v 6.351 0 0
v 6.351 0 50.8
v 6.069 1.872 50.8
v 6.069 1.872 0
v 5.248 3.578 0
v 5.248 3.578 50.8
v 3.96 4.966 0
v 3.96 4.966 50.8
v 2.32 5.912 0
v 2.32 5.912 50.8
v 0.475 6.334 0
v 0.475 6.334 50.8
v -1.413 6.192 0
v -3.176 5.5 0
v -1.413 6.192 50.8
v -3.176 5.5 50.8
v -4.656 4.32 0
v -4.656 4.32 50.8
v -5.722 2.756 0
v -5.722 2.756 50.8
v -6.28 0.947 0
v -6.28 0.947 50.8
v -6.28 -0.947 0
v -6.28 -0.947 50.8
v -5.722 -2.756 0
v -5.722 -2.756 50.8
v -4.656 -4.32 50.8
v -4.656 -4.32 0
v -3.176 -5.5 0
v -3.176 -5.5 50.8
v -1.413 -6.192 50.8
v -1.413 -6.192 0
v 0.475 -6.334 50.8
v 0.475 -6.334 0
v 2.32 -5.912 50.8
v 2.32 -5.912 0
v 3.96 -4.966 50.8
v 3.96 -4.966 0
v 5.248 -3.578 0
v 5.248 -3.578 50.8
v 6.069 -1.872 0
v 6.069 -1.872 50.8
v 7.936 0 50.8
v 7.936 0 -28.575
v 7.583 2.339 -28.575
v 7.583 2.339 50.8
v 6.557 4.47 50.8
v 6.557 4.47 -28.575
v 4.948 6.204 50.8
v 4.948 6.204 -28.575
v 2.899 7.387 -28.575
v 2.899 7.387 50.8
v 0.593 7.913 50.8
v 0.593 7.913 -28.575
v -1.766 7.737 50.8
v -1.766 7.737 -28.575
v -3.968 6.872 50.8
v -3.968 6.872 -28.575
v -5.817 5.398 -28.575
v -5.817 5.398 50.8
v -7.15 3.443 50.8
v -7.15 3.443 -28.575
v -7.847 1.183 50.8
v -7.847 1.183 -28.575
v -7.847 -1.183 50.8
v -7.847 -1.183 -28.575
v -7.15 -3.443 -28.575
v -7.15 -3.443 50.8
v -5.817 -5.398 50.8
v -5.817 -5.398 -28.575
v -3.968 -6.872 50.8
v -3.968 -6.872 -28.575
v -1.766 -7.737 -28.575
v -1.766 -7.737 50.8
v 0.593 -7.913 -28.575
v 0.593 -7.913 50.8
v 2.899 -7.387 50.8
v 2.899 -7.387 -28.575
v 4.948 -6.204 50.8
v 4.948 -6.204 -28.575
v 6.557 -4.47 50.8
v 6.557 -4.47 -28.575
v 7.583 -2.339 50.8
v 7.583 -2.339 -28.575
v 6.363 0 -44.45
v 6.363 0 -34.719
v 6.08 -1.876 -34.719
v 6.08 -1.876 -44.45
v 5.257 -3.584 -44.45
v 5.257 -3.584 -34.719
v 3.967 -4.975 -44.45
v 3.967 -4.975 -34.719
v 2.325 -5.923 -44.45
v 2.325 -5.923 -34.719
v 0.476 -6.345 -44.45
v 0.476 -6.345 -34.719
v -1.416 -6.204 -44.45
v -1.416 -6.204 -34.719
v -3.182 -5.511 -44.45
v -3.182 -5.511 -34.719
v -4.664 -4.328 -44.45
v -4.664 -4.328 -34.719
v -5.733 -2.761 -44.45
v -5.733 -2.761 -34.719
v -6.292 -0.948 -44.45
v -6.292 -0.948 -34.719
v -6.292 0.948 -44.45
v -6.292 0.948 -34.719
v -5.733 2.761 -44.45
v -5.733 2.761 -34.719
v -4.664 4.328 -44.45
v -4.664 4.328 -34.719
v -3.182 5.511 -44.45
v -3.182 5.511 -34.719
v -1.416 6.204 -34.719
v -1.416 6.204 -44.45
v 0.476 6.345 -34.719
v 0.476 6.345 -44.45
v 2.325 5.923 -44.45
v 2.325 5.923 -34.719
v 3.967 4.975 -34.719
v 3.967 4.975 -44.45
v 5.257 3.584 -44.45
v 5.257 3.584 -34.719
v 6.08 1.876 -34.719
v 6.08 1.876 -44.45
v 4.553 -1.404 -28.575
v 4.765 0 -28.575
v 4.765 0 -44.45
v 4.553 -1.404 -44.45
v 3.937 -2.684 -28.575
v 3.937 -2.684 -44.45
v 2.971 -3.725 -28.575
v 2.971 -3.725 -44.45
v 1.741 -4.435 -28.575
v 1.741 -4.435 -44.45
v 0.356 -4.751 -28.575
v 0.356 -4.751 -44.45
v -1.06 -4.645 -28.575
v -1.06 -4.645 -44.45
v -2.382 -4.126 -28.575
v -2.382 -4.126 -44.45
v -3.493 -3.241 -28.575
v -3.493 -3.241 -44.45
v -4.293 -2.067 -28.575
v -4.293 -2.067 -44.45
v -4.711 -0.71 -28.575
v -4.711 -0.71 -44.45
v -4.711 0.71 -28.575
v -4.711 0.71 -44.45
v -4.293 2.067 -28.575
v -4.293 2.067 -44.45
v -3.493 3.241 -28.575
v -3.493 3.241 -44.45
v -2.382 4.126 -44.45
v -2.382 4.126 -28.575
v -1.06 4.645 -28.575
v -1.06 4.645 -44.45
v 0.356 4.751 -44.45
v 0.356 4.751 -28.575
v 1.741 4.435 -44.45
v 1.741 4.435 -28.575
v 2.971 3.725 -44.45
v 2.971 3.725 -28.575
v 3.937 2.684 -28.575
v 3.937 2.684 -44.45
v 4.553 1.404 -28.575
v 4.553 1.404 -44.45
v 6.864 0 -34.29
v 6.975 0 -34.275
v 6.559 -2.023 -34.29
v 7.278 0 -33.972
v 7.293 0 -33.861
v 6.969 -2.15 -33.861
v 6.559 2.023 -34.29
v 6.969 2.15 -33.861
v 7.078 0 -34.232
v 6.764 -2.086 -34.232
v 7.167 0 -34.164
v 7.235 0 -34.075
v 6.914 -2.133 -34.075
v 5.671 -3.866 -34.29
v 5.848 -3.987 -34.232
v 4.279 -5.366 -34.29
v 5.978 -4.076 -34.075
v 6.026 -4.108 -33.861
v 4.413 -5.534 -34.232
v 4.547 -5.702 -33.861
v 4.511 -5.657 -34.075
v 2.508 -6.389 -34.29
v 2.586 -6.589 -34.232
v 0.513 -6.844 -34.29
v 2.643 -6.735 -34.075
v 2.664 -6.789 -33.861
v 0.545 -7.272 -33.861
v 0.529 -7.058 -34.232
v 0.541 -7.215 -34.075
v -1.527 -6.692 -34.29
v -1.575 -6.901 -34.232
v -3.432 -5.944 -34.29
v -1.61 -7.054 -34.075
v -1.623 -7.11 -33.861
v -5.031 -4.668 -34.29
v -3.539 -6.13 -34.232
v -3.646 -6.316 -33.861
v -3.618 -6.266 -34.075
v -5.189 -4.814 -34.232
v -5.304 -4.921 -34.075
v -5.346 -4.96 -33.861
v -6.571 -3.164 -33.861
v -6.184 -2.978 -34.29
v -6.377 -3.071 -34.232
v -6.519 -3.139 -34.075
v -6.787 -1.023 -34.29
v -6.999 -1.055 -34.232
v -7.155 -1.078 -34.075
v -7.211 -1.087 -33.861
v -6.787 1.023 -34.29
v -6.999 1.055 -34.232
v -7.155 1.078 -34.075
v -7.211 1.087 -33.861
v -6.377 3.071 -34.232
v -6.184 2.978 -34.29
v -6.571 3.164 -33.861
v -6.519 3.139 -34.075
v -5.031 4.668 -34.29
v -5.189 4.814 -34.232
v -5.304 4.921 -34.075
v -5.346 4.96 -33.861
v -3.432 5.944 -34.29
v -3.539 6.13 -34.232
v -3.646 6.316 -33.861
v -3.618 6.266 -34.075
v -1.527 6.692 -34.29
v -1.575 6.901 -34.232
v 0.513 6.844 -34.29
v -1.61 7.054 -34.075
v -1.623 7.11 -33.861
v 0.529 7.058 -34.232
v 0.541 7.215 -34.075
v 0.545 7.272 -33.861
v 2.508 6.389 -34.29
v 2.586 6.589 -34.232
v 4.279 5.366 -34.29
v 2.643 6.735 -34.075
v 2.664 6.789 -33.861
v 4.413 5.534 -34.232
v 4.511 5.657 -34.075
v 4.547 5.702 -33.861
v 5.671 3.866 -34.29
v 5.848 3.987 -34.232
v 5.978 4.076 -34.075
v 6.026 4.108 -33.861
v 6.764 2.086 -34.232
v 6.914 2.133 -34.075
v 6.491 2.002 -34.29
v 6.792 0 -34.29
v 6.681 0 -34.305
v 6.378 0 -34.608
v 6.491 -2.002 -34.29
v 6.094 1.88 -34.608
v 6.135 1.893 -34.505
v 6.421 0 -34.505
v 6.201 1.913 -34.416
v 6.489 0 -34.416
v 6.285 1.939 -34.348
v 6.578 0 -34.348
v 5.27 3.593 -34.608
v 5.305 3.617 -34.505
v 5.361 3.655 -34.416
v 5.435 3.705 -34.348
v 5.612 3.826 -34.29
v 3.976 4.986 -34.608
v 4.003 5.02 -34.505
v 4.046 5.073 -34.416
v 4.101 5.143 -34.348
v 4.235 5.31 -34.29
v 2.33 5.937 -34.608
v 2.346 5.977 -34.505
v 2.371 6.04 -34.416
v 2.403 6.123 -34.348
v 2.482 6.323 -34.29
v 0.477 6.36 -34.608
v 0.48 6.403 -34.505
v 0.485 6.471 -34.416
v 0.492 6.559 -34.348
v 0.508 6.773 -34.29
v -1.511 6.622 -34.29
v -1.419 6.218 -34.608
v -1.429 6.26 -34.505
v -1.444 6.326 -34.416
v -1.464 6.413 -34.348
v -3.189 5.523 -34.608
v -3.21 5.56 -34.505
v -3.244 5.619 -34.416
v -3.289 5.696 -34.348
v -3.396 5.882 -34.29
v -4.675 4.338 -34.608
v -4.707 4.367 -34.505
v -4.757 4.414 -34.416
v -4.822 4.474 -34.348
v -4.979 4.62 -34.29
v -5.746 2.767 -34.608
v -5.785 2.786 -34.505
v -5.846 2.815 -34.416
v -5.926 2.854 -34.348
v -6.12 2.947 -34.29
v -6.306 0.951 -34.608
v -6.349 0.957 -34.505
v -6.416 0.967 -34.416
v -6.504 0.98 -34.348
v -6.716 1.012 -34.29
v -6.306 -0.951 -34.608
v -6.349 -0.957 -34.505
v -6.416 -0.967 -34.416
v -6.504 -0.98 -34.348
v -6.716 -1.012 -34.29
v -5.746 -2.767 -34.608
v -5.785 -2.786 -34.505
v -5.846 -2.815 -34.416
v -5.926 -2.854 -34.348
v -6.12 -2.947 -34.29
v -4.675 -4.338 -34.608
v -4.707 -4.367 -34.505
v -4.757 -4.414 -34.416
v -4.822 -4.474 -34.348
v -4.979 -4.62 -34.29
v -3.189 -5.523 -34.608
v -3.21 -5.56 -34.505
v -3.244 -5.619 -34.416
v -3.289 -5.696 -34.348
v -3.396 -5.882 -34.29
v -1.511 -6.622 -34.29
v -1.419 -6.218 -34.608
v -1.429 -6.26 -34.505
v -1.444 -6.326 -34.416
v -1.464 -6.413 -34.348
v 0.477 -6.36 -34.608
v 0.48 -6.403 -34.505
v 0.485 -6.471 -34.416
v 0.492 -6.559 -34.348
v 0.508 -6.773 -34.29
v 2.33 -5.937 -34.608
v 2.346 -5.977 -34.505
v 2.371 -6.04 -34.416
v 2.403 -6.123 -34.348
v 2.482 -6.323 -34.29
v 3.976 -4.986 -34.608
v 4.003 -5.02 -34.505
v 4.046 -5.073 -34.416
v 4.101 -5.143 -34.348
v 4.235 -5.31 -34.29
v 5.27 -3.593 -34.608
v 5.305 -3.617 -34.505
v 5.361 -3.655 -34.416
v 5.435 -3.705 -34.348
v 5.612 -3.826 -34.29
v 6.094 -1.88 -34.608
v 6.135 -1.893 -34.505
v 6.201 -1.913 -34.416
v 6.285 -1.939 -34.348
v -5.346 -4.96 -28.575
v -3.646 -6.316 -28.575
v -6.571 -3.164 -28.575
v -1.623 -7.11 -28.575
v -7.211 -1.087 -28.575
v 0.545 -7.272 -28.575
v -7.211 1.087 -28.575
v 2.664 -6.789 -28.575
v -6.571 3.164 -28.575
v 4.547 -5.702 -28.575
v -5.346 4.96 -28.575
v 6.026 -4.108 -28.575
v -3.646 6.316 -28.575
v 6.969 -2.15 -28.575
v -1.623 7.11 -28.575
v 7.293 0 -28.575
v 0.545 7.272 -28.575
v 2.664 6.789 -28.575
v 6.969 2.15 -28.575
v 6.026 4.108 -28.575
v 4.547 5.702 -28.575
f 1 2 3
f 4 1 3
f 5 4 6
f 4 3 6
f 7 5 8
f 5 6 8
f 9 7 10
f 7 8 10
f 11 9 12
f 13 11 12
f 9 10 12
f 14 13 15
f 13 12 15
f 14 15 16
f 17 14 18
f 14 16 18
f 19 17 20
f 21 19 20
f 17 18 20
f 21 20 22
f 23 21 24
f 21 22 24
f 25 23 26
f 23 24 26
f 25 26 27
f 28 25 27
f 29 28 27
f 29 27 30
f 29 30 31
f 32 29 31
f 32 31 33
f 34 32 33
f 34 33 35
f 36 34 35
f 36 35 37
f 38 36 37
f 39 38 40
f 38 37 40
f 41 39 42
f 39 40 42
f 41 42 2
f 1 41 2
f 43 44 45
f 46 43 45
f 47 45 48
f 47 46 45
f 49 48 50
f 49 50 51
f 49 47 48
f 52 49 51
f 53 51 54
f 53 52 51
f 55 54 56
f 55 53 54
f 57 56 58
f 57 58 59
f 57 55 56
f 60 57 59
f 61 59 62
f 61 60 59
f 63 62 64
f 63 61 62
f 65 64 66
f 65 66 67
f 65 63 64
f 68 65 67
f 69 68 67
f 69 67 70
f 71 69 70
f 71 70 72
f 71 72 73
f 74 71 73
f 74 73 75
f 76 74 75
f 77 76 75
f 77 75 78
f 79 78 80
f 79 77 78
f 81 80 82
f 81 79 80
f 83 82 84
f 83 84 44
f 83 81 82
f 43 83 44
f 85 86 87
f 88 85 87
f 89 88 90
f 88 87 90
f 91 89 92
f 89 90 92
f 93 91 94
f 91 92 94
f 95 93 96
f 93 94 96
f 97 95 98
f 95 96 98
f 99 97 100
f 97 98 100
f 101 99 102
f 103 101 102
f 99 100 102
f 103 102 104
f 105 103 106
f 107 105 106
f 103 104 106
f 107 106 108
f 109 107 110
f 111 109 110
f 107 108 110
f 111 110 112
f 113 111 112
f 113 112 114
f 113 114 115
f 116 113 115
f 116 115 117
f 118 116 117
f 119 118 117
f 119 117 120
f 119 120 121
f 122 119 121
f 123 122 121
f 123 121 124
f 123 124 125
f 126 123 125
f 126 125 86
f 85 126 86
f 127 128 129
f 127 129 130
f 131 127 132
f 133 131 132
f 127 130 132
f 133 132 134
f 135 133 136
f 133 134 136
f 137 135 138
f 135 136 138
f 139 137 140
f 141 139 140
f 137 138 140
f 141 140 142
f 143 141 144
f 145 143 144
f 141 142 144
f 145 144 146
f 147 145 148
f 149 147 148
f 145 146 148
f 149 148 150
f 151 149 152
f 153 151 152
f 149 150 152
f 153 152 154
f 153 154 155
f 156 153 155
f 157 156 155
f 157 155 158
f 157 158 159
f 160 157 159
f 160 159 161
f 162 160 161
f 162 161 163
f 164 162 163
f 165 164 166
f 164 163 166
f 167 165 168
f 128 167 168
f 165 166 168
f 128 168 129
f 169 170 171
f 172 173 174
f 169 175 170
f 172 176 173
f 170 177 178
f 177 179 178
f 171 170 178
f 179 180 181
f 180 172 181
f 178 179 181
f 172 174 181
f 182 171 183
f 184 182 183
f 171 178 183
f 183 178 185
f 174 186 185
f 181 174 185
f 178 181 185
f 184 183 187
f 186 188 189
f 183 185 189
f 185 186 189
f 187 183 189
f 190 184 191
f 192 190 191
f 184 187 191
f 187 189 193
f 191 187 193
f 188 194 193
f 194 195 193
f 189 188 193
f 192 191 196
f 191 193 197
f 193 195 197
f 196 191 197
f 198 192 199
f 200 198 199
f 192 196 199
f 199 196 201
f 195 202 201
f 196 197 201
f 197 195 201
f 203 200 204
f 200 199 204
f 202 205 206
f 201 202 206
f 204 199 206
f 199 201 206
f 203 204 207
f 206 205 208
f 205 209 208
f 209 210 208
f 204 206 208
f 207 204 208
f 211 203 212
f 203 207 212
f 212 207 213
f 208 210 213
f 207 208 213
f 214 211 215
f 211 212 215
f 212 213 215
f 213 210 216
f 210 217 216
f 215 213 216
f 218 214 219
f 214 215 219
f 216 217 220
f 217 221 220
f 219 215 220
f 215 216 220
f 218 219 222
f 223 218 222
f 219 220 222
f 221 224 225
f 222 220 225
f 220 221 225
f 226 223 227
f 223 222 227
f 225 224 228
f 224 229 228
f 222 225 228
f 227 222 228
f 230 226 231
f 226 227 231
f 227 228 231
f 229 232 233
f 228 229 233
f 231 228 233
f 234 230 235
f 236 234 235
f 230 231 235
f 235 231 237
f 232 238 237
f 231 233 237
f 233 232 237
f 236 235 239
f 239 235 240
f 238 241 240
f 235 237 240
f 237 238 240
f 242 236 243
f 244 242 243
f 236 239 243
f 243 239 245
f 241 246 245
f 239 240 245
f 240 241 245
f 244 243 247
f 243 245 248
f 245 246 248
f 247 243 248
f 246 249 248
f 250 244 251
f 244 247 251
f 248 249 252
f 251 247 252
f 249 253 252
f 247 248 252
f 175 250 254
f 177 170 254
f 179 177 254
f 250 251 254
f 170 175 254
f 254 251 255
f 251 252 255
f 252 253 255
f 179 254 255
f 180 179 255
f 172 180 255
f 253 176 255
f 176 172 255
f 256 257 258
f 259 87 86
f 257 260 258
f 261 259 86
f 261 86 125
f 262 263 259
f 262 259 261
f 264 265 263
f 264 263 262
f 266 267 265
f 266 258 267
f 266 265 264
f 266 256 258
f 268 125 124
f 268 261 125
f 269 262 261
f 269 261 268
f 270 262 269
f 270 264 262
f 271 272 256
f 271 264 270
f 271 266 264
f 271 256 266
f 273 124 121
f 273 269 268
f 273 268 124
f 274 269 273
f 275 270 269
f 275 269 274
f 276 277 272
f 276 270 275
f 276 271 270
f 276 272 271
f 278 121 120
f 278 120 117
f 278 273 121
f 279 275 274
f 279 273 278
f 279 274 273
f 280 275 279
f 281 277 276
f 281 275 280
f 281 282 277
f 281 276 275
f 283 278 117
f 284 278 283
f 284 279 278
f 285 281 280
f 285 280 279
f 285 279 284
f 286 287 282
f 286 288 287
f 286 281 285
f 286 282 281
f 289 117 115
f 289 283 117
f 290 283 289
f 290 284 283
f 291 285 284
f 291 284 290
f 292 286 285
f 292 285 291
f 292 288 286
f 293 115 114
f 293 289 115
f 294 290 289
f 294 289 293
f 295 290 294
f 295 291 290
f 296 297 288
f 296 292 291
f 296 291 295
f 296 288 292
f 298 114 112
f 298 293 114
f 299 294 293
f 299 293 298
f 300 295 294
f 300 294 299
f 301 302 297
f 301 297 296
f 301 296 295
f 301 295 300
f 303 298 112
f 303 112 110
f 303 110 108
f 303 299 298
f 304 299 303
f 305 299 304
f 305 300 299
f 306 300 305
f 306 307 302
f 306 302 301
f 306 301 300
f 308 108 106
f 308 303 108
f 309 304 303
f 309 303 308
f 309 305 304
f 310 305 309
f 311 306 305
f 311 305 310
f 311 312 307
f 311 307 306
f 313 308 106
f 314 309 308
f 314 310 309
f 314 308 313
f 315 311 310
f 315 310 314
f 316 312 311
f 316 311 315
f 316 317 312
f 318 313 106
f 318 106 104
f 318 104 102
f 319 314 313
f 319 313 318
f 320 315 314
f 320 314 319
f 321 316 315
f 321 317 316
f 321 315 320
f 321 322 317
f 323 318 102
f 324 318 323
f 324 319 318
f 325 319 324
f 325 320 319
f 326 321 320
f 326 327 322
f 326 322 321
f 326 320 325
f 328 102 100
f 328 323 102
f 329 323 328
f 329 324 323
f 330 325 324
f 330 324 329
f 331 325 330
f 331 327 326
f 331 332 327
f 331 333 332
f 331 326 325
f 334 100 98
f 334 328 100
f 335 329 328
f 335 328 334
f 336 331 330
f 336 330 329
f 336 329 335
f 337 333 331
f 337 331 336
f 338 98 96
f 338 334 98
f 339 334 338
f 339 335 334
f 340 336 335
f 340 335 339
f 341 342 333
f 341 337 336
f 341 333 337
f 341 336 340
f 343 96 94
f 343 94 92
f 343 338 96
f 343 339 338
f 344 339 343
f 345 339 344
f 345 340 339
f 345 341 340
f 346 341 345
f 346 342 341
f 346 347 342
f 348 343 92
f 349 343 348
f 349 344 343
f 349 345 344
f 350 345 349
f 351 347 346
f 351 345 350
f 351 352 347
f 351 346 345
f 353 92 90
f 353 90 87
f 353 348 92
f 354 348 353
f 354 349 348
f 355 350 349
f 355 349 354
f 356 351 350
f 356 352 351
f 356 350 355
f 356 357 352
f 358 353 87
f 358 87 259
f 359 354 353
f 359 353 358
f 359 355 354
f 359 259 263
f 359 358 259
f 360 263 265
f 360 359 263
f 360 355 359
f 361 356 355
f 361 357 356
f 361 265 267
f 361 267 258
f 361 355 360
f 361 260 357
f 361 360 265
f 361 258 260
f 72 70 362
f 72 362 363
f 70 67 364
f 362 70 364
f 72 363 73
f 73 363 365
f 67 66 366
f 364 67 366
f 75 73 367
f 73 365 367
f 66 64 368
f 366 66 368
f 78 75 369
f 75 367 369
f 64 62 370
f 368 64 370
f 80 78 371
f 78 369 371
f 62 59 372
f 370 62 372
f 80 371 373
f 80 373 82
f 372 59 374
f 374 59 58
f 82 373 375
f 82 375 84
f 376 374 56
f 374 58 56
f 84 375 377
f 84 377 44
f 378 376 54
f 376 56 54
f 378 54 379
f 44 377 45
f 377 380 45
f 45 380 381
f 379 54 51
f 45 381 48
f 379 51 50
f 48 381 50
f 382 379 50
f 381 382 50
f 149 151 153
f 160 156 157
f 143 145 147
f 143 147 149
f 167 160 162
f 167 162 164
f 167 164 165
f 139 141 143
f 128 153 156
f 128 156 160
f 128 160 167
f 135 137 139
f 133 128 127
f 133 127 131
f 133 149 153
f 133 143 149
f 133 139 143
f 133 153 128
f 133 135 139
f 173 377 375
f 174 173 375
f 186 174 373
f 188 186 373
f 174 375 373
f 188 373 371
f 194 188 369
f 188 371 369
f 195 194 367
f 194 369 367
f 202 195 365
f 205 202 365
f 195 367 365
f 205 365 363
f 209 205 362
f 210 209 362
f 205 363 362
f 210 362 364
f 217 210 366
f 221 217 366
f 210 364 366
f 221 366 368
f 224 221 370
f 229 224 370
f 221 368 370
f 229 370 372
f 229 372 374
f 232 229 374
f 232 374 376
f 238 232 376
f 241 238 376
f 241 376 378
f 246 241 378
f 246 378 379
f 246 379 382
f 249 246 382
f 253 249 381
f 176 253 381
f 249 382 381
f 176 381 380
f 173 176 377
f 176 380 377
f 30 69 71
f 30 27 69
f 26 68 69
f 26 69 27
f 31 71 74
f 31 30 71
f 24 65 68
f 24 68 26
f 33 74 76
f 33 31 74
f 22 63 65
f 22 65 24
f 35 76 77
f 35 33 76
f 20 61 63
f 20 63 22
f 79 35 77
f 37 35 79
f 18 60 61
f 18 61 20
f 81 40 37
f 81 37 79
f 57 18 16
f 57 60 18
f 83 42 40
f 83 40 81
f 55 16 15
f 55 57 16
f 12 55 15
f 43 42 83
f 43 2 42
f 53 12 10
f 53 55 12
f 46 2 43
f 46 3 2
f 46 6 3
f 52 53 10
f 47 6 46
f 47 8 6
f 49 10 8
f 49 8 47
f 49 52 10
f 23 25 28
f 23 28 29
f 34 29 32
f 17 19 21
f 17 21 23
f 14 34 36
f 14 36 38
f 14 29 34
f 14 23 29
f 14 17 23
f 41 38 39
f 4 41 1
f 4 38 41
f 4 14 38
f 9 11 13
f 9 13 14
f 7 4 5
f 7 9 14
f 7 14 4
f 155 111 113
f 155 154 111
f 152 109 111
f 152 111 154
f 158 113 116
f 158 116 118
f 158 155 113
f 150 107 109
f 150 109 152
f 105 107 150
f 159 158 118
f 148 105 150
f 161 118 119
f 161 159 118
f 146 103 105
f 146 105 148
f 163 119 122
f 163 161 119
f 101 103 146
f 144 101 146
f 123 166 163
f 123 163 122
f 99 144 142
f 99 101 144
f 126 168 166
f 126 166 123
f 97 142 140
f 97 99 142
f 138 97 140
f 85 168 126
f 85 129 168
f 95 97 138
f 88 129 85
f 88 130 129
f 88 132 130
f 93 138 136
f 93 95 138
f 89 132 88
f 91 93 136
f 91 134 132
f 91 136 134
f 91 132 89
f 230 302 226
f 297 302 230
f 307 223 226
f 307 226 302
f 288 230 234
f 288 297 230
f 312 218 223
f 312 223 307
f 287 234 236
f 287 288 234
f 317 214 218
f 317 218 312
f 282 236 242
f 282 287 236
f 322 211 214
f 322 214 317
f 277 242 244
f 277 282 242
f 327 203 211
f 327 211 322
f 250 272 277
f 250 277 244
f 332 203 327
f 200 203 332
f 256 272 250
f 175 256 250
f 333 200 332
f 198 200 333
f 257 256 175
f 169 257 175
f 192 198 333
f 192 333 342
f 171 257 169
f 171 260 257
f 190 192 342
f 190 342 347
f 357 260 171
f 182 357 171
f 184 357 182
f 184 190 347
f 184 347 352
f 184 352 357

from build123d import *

# Parameters (mm, degrees)
F0_R      = 7.9355102155
F1_DEPTH  = 50.8
F2_DEPTH  = 28.575
F3_R      = 7.2928540477
F5_DEPTH  = 5.715
F4_R      = 6.3630946633
F6_DEPTH  = 15.875
F7_R      = 0.4292471714
F8_R      = 4.7645441954
F9_DEPTH  = 15.875
F10_R     = 6.351340122
F11_DEPTH = 50.8


with BuildPart() as f1:
    # F0 (on Top) → F1 (new body)
    with BuildSketch(Plane.XY):
        Circle(F0_R)
    extrude(amount=F1_DEPTH)

    # F2 (add): a face of the model
    f2_faces = [f1.faces().sort_by_distance(p)[0] for p in [
        (0, 0, 0),
    ]]
    extrude(f2_faces, amount=F2_DEPTH)

    # F3 (on face) → F5 (join)
    with BuildSketch(Plane(origin=(0, 0, -28.575), x_dir=(1, 0, 0), z_dir=(0, 0, -1))):
        Circle(F3_R)
    extrude(amount=F5_DEPTH)

    # F4 (on face) → F6 (join)
    with BuildSketch(Plane(origin=(0, 0, -28.575), x_dir=(1, 0, 0), z_dir=(0, 0, -1))):
        Circle(F4_R)
    extrude(amount=F6_DEPTH)

    # F7
    f7_edges = [f1.edges().sort_by_distance(p)[0] for p in [
        (-6.363095, 0, -34.29),
        (-7.292854, 0, -34.29),
    ]]
    fillet(f7_edges, radius=F7_R)

    # F8 (on face) → F9 (cut)
    with BuildSketch(Plane(origin=(0, 0, -44.45), x_dir=(1, 0, 0), z_dir=(0, 0, -1))):
        Circle(F8_R)
    extrude(amount=-F9_DEPTH, mode=Mode.SUBTRACT)

    # F10 (on face) → F11 (cut)
    with BuildSketch(Plane.XY.offset(50.8)):
        Circle(F10_R)
    extrude(amount=-F11_DEPTH, mode=Mode.SUBTRACT)


solid = f1.part
